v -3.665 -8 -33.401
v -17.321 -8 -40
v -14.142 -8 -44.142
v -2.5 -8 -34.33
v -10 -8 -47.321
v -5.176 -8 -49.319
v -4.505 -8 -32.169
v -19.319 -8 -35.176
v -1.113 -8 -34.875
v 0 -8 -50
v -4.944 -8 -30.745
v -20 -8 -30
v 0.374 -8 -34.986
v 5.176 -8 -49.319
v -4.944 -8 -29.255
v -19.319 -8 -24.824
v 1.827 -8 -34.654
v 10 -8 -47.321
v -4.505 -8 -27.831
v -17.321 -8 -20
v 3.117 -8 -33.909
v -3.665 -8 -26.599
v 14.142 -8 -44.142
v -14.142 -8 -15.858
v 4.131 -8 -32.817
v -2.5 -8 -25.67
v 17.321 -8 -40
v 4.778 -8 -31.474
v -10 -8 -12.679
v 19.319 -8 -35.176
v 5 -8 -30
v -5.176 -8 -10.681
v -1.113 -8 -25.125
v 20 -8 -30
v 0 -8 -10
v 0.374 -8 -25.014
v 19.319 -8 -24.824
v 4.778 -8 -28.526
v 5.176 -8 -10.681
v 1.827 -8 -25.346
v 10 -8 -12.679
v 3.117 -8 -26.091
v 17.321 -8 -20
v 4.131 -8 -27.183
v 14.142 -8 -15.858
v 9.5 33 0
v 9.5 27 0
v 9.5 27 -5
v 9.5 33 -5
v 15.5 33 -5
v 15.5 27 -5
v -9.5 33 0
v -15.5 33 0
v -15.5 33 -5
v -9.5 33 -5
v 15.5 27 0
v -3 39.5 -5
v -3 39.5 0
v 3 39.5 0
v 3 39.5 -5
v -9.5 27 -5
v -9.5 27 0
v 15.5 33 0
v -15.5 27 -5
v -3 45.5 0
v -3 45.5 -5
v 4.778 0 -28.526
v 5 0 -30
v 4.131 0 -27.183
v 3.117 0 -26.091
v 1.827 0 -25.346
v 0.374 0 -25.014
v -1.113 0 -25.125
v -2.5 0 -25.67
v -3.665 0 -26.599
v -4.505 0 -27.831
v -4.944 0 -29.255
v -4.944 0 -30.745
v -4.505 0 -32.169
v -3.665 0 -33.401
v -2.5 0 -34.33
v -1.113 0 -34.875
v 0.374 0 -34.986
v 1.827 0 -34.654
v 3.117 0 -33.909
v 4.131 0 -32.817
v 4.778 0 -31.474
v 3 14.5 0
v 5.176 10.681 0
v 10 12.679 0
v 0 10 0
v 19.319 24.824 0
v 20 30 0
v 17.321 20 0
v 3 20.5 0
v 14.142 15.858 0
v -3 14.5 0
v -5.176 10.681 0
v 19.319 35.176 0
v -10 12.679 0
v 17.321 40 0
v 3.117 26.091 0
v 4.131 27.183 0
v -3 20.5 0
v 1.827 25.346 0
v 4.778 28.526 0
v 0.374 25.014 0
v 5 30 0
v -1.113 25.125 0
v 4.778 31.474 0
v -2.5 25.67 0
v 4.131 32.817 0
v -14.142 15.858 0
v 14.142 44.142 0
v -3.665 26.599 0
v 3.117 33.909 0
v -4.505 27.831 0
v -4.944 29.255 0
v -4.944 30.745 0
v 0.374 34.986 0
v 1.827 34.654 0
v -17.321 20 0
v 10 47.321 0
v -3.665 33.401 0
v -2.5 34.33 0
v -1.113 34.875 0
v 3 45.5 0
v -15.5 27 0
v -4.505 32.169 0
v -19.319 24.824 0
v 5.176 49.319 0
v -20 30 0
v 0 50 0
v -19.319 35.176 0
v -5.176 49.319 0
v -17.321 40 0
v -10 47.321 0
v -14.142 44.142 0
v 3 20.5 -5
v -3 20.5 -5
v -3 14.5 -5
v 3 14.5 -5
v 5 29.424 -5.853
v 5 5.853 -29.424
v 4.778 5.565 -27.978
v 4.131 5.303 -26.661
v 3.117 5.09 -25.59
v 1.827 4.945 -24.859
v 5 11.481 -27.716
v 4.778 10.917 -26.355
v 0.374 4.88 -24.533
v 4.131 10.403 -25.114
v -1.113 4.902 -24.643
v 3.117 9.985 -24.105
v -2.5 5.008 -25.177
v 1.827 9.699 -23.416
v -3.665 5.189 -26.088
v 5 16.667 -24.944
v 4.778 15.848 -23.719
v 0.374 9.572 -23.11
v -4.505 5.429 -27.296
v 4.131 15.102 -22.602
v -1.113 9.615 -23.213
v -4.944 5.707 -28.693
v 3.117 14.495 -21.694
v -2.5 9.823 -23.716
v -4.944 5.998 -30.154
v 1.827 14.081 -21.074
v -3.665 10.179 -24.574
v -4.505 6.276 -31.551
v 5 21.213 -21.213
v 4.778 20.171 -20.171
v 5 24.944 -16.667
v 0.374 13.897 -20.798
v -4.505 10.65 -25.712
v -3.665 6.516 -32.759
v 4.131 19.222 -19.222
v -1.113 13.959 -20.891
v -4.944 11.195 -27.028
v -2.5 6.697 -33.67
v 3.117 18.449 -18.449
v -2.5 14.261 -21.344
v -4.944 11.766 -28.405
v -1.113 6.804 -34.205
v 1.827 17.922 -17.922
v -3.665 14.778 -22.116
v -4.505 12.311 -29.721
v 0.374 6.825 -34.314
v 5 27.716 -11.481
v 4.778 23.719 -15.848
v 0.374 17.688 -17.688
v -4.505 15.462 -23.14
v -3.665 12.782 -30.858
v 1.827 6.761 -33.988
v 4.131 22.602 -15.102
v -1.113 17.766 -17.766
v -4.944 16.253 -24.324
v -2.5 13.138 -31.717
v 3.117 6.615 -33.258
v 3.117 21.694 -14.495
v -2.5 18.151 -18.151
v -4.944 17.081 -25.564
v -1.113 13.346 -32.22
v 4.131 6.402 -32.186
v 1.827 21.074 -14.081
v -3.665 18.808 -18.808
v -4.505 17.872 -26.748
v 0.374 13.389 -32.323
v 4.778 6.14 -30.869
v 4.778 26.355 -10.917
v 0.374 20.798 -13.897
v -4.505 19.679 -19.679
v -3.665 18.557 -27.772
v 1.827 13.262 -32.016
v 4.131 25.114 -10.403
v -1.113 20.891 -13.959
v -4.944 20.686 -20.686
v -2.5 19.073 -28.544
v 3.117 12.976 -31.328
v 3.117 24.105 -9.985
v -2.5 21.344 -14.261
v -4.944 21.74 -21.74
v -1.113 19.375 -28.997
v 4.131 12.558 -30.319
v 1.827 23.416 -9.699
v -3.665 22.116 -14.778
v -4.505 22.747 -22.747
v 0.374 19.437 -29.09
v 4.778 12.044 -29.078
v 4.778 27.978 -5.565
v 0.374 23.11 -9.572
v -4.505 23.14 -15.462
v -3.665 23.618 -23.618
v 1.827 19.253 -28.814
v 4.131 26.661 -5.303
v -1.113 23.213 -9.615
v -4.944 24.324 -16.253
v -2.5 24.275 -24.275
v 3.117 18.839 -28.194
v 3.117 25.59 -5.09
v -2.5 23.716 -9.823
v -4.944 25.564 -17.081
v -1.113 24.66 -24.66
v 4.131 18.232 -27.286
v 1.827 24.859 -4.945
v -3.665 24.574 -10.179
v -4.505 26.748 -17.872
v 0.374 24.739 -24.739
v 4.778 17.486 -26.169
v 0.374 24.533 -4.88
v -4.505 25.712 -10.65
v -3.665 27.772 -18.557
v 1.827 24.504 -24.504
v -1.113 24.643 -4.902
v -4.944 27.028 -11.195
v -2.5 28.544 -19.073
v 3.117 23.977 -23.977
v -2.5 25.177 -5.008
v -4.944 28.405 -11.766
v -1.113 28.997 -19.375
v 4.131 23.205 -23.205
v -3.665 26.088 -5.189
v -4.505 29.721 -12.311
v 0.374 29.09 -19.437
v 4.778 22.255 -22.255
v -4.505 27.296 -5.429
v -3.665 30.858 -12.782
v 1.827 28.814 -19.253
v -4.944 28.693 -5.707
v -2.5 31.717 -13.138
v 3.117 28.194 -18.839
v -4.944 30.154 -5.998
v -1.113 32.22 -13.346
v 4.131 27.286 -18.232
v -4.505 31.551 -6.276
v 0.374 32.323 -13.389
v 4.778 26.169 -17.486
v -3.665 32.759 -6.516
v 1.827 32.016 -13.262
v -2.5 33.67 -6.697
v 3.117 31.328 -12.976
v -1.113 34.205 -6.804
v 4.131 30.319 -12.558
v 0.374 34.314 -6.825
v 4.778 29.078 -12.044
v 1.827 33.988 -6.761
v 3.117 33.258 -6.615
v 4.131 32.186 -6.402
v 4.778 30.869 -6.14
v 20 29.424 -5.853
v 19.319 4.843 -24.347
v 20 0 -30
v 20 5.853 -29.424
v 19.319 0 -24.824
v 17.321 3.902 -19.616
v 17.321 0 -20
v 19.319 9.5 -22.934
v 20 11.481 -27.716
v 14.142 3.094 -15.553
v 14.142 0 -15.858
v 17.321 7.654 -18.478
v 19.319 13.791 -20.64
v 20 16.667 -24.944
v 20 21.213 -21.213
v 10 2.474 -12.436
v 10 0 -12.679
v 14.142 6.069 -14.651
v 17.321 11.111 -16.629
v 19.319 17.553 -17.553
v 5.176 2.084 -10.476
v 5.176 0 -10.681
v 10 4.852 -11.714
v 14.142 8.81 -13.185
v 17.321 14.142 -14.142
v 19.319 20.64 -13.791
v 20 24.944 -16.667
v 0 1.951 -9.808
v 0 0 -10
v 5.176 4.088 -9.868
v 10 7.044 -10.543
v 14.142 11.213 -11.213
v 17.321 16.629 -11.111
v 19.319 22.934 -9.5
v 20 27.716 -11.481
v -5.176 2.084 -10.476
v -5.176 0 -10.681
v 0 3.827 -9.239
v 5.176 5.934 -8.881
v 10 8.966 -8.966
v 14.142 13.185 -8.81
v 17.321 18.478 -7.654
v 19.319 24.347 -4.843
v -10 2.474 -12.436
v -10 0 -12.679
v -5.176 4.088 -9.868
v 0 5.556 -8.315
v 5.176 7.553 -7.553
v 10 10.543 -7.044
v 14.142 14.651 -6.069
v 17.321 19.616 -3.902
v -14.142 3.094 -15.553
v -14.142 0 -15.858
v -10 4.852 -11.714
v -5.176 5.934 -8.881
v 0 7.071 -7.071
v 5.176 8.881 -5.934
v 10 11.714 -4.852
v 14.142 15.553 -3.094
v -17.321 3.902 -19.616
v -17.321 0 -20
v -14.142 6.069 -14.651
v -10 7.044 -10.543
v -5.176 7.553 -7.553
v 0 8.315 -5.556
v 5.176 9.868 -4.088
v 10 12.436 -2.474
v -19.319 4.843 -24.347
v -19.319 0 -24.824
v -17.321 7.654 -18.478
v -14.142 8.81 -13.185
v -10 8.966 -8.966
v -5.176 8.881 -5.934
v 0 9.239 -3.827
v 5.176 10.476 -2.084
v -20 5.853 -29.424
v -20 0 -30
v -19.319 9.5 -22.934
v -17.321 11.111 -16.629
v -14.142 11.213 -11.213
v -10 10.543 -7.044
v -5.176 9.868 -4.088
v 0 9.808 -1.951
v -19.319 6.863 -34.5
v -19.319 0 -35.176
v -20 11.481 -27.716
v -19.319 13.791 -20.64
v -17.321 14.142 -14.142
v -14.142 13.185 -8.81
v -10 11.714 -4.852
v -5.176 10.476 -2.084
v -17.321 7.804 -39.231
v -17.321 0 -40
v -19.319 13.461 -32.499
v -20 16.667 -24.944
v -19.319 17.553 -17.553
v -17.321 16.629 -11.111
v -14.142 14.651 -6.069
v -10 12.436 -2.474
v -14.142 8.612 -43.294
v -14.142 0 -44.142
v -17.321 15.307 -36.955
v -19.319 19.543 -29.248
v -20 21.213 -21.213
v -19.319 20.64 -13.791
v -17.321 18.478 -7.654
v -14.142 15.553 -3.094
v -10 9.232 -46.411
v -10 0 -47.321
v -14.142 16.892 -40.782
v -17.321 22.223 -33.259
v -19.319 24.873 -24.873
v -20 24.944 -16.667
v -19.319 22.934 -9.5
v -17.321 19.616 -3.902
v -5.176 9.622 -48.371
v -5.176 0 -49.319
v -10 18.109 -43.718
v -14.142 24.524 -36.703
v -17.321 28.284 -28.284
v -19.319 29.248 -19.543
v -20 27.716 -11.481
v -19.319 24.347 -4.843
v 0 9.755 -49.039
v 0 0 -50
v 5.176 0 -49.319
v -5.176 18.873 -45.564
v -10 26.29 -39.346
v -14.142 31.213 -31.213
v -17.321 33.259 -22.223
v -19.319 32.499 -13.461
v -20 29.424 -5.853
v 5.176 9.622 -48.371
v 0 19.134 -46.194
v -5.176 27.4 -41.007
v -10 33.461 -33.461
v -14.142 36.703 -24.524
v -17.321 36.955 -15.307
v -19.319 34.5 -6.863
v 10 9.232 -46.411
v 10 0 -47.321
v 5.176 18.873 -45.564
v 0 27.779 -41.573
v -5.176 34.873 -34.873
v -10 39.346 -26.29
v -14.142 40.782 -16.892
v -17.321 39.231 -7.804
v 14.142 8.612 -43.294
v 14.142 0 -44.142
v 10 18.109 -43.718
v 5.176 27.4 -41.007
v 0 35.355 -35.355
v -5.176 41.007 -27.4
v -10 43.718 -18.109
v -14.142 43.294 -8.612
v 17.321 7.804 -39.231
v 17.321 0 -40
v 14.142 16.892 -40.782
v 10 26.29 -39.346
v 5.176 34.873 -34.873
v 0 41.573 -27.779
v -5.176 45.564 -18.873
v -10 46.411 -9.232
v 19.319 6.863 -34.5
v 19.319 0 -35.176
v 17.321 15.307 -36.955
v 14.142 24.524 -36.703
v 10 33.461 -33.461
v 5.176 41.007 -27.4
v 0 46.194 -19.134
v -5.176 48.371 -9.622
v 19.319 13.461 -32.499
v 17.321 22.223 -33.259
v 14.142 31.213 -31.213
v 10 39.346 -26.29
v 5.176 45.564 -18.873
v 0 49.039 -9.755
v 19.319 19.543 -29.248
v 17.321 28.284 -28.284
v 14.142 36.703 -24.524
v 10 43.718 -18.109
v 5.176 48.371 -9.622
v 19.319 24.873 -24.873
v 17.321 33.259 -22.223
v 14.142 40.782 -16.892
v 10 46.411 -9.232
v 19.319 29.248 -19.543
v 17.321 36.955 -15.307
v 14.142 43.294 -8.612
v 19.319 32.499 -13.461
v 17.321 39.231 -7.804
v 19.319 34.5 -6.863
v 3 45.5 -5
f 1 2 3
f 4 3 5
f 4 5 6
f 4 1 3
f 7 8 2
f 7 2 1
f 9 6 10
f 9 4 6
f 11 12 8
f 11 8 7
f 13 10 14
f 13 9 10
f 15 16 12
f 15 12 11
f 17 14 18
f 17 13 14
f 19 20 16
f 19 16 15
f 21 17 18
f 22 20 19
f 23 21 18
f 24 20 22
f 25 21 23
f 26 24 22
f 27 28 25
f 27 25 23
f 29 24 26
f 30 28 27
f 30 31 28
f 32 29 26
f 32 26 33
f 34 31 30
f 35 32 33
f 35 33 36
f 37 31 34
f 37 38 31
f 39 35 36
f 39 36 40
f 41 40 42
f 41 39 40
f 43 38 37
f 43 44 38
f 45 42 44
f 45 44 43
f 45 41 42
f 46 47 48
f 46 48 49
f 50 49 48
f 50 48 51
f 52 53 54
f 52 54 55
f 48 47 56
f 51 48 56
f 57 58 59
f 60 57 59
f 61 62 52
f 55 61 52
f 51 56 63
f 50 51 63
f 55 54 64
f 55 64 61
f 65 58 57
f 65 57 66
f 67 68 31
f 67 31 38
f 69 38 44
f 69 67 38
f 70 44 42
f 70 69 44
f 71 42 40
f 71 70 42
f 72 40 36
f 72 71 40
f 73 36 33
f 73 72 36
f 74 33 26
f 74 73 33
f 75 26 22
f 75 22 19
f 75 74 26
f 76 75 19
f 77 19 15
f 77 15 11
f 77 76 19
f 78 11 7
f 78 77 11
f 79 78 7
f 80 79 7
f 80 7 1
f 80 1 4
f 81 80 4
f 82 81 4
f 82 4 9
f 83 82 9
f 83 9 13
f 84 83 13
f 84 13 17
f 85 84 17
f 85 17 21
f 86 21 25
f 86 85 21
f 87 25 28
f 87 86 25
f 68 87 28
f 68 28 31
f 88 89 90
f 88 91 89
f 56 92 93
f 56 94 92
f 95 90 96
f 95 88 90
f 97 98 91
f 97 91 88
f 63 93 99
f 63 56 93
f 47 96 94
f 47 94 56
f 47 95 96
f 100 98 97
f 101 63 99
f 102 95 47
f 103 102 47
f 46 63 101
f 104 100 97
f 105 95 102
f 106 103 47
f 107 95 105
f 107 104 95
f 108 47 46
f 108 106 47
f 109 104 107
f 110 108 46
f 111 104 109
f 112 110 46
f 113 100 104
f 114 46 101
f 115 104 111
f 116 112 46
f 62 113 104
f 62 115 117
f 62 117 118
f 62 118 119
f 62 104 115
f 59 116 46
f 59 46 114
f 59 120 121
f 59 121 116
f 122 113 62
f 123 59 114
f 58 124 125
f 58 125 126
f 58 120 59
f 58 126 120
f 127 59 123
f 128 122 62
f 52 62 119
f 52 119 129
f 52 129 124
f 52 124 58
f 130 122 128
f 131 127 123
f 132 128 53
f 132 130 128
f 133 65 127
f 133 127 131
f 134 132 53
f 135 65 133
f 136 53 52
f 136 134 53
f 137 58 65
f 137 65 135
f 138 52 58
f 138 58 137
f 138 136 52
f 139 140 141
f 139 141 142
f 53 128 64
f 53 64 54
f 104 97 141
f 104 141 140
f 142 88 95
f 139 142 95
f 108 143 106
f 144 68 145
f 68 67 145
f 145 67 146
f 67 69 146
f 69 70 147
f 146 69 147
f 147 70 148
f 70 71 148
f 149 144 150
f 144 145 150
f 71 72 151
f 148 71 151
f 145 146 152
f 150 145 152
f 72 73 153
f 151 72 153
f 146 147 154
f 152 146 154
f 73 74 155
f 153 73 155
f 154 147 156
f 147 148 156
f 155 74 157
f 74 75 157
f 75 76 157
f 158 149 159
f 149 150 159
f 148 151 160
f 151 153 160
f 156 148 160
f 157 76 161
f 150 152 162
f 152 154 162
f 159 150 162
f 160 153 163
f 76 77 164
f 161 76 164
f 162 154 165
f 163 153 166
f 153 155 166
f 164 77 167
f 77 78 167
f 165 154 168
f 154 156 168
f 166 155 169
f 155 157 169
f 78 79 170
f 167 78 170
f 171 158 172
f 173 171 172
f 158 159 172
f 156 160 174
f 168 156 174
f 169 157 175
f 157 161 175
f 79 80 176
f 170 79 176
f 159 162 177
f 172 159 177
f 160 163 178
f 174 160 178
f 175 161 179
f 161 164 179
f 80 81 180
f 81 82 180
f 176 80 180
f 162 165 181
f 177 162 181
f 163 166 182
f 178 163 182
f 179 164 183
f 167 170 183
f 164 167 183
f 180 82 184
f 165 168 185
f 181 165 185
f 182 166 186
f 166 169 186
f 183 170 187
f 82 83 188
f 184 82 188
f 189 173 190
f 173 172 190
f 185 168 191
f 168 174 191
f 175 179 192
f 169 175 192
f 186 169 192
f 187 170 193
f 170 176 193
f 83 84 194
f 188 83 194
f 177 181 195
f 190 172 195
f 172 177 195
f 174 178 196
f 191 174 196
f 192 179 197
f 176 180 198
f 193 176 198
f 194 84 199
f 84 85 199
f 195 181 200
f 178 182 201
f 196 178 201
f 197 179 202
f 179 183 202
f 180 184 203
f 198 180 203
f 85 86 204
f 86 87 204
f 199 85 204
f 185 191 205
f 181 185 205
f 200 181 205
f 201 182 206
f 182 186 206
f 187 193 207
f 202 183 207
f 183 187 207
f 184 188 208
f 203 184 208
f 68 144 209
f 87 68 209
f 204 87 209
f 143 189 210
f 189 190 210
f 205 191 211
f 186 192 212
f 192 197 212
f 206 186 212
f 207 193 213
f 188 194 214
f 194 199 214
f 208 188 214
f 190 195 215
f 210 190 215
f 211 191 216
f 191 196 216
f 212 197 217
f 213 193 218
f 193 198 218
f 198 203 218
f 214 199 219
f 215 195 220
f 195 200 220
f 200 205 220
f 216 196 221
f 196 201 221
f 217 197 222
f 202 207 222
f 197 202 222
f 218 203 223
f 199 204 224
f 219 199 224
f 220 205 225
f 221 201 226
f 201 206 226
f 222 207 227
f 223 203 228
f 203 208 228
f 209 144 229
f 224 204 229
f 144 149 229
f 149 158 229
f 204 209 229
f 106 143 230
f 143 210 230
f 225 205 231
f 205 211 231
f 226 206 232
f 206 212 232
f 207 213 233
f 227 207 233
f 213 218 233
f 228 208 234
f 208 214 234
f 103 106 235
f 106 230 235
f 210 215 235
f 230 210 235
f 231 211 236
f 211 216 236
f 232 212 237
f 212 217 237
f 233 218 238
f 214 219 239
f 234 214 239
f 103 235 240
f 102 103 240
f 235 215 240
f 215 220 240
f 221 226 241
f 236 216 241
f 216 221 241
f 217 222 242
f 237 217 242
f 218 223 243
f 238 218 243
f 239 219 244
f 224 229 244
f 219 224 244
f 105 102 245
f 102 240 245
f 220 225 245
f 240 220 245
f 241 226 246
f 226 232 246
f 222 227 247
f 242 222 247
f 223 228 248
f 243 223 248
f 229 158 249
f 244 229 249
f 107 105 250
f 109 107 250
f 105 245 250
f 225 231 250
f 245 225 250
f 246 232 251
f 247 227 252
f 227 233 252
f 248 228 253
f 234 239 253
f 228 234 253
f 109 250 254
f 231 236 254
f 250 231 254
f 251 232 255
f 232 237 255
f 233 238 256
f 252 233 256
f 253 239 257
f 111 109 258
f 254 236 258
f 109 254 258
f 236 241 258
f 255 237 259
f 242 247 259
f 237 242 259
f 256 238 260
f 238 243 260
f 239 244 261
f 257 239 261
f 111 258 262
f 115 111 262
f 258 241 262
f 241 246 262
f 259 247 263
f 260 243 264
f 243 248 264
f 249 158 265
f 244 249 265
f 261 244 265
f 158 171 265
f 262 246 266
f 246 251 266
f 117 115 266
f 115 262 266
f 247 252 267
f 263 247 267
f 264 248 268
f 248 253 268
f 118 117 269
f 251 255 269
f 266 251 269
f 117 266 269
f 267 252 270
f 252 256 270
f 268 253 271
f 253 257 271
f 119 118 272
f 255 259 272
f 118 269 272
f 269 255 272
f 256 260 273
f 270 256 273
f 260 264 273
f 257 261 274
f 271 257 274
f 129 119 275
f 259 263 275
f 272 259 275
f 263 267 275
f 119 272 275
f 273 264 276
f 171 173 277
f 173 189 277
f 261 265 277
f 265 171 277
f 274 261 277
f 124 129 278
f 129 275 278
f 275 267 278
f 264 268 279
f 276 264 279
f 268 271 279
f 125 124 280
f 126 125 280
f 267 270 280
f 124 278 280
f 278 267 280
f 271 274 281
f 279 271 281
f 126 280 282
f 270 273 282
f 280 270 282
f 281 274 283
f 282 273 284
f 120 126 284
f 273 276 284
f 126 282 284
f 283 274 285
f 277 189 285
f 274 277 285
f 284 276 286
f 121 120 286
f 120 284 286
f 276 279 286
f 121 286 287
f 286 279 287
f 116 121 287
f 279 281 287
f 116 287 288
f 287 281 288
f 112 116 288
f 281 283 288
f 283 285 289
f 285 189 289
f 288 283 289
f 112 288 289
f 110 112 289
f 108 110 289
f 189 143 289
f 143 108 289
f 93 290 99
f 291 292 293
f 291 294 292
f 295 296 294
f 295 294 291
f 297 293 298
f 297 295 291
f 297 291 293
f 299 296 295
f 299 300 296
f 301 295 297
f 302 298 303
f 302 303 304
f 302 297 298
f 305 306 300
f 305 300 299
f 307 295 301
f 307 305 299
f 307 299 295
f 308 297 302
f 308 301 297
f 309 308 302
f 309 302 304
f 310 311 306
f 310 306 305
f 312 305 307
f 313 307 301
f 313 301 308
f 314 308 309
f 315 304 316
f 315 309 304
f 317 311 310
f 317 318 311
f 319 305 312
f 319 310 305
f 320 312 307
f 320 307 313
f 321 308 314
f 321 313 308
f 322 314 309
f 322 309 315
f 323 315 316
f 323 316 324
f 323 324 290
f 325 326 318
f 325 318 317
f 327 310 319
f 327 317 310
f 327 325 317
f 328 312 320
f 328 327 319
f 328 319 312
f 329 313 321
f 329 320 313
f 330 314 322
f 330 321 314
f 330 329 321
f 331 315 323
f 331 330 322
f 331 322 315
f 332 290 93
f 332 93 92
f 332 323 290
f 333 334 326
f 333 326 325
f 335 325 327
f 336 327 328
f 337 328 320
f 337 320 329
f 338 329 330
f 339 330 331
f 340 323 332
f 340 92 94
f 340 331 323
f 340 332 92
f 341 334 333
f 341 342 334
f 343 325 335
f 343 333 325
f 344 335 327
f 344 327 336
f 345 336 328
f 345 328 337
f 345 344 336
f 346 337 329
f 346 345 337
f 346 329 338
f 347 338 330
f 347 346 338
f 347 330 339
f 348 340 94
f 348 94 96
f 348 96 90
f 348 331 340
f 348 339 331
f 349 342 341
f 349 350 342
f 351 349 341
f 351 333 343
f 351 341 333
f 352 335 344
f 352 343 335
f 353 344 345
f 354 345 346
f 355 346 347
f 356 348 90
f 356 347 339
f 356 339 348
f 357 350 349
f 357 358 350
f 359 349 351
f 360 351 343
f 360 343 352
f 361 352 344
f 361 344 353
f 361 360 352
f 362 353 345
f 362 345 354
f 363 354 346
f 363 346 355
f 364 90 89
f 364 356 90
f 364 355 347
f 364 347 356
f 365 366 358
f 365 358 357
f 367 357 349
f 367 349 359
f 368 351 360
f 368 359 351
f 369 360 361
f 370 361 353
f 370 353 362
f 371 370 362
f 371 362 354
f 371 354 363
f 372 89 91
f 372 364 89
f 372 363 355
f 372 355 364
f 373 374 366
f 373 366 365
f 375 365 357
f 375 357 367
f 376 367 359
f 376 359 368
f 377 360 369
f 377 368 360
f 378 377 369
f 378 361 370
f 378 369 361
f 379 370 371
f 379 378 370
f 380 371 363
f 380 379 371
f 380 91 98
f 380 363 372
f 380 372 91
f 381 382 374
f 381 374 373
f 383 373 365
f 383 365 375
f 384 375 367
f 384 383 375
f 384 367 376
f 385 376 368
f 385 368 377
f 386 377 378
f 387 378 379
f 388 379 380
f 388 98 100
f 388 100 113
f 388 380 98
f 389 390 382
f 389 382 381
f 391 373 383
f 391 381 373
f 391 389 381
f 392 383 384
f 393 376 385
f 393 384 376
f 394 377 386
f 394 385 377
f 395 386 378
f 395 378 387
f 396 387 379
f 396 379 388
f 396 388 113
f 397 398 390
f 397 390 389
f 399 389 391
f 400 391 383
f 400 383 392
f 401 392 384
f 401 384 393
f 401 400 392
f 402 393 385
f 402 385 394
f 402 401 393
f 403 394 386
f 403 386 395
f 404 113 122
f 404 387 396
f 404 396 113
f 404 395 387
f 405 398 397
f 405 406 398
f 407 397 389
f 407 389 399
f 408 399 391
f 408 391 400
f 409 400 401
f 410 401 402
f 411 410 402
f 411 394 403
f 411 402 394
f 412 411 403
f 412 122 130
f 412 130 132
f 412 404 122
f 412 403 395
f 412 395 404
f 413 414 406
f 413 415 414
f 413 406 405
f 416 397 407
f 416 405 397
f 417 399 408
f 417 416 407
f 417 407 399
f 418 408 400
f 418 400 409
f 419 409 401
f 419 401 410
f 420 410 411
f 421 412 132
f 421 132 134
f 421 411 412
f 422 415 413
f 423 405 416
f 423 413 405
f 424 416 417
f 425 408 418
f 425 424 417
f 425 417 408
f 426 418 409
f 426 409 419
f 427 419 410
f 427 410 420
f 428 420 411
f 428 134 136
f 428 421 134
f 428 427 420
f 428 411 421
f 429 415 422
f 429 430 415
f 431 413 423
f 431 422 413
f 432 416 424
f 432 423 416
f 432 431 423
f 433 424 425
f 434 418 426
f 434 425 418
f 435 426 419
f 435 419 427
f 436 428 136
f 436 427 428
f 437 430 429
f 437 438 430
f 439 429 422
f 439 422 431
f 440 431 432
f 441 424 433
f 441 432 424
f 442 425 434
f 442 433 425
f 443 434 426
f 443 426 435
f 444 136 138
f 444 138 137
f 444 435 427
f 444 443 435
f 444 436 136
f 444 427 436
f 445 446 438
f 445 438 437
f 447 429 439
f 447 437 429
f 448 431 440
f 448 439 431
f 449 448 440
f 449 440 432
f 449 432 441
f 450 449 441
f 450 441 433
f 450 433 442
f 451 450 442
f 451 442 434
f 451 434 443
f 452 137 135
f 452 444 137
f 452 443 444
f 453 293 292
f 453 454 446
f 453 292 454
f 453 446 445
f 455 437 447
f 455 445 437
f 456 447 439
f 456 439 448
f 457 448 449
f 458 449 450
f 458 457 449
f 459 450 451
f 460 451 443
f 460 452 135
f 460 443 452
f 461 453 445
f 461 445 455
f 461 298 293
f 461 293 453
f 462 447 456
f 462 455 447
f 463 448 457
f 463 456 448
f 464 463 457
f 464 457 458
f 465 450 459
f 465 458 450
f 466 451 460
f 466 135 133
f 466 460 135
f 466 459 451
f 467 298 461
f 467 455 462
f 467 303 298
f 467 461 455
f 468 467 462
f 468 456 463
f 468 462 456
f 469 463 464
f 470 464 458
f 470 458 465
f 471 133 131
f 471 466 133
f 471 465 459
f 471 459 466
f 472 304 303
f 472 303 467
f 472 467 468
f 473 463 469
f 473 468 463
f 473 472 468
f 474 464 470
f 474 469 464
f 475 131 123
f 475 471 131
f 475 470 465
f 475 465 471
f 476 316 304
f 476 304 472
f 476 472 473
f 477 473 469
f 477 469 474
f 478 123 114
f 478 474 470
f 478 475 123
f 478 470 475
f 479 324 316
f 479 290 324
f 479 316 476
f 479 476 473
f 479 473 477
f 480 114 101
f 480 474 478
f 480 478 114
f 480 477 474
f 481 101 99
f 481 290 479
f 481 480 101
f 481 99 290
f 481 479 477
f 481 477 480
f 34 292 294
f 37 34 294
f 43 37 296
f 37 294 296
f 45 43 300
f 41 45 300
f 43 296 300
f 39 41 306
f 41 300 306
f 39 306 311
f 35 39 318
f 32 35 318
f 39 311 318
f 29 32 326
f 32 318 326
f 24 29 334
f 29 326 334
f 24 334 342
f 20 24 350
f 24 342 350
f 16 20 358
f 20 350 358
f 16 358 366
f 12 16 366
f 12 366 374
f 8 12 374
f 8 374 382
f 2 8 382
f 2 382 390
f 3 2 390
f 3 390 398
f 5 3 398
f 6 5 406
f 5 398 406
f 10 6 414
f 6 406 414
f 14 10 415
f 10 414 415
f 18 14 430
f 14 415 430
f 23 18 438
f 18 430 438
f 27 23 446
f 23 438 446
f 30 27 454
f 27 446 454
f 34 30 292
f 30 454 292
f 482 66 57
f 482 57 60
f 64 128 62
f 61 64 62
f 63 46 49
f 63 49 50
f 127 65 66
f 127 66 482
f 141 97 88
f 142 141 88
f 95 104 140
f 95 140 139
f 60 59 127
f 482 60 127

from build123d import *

# Parameters (mm, degrees)
SKETCH3_R           = 20
SKETCH3_R_2         = 5
SKETCH6_R           = 20
SKETCH6_R_2         = 5
BOSS_EXTRUDE1_DEPTH = 8
SKETCH10_W          = 6
SKETCH10_H          = 6
CUT_EXTRUDE5_DEPTH  = 5


with BuildPart() as part:
    # Sweep1: sweep along a path in Sketch2
    with BuildLine(Plane(origin=(0, 0, 0), x_dir=(0, 0, -1), z_dir=(1, 0, 0))) as sweep1_path:
        ThreePointArc((30, 0), (21.213203436, 21.213203436), (0, 30))
    # Sketch3 → Sweep1 (sweep)
    with BuildSketch(Plane(origin=(0, 0, 0), x_dir=(1, 0, 0), z_dir=(0, 1, 0))):
        with Locations((0, 30)):
            Circle(SKETCH3_R)
        with Locations((0, 30)):
            Circle(SKETCH3_R_2, mode=Mode.SUBTRACT)
    sweep(path=sweep1_path.line)

    # Sketch6 → Boss-Extrude1 (add)
    with BuildSketch(Plane.XZ):
        with Locations((0, -30)):
            Circle(SKETCH6_R)
        with Locations((0, -30)):
            Circle(SKETCH6_R_2, mode=Mode.SUBTRACT)
    extrude(amount=BOSS_EXTRUDE1_DEPTH)

    # Sketch10 → Cut-Extrude5 (cut)
    with BuildSketch(Plane.XY):
        with Locations((0, 42.5)):
            Rectangle(SKETCH10_W, SKETCH10_H)
        with Locations((-12.5, 30)):
            Rectangle(SKETCH10_W, SKETCH10_H)
        with Locations((12.5, 30)):
            Rectangle(SKETCH10_W, SKETCH10_H)
        with Locations((0, 17.5)):
            Rectangle(SKETCH10_W, SKETCH10_H)
    extrude(amount=-CUT_EXTRUDE5_DEPTH, mode=Mode.SUBTRACT)


solid = part.part
